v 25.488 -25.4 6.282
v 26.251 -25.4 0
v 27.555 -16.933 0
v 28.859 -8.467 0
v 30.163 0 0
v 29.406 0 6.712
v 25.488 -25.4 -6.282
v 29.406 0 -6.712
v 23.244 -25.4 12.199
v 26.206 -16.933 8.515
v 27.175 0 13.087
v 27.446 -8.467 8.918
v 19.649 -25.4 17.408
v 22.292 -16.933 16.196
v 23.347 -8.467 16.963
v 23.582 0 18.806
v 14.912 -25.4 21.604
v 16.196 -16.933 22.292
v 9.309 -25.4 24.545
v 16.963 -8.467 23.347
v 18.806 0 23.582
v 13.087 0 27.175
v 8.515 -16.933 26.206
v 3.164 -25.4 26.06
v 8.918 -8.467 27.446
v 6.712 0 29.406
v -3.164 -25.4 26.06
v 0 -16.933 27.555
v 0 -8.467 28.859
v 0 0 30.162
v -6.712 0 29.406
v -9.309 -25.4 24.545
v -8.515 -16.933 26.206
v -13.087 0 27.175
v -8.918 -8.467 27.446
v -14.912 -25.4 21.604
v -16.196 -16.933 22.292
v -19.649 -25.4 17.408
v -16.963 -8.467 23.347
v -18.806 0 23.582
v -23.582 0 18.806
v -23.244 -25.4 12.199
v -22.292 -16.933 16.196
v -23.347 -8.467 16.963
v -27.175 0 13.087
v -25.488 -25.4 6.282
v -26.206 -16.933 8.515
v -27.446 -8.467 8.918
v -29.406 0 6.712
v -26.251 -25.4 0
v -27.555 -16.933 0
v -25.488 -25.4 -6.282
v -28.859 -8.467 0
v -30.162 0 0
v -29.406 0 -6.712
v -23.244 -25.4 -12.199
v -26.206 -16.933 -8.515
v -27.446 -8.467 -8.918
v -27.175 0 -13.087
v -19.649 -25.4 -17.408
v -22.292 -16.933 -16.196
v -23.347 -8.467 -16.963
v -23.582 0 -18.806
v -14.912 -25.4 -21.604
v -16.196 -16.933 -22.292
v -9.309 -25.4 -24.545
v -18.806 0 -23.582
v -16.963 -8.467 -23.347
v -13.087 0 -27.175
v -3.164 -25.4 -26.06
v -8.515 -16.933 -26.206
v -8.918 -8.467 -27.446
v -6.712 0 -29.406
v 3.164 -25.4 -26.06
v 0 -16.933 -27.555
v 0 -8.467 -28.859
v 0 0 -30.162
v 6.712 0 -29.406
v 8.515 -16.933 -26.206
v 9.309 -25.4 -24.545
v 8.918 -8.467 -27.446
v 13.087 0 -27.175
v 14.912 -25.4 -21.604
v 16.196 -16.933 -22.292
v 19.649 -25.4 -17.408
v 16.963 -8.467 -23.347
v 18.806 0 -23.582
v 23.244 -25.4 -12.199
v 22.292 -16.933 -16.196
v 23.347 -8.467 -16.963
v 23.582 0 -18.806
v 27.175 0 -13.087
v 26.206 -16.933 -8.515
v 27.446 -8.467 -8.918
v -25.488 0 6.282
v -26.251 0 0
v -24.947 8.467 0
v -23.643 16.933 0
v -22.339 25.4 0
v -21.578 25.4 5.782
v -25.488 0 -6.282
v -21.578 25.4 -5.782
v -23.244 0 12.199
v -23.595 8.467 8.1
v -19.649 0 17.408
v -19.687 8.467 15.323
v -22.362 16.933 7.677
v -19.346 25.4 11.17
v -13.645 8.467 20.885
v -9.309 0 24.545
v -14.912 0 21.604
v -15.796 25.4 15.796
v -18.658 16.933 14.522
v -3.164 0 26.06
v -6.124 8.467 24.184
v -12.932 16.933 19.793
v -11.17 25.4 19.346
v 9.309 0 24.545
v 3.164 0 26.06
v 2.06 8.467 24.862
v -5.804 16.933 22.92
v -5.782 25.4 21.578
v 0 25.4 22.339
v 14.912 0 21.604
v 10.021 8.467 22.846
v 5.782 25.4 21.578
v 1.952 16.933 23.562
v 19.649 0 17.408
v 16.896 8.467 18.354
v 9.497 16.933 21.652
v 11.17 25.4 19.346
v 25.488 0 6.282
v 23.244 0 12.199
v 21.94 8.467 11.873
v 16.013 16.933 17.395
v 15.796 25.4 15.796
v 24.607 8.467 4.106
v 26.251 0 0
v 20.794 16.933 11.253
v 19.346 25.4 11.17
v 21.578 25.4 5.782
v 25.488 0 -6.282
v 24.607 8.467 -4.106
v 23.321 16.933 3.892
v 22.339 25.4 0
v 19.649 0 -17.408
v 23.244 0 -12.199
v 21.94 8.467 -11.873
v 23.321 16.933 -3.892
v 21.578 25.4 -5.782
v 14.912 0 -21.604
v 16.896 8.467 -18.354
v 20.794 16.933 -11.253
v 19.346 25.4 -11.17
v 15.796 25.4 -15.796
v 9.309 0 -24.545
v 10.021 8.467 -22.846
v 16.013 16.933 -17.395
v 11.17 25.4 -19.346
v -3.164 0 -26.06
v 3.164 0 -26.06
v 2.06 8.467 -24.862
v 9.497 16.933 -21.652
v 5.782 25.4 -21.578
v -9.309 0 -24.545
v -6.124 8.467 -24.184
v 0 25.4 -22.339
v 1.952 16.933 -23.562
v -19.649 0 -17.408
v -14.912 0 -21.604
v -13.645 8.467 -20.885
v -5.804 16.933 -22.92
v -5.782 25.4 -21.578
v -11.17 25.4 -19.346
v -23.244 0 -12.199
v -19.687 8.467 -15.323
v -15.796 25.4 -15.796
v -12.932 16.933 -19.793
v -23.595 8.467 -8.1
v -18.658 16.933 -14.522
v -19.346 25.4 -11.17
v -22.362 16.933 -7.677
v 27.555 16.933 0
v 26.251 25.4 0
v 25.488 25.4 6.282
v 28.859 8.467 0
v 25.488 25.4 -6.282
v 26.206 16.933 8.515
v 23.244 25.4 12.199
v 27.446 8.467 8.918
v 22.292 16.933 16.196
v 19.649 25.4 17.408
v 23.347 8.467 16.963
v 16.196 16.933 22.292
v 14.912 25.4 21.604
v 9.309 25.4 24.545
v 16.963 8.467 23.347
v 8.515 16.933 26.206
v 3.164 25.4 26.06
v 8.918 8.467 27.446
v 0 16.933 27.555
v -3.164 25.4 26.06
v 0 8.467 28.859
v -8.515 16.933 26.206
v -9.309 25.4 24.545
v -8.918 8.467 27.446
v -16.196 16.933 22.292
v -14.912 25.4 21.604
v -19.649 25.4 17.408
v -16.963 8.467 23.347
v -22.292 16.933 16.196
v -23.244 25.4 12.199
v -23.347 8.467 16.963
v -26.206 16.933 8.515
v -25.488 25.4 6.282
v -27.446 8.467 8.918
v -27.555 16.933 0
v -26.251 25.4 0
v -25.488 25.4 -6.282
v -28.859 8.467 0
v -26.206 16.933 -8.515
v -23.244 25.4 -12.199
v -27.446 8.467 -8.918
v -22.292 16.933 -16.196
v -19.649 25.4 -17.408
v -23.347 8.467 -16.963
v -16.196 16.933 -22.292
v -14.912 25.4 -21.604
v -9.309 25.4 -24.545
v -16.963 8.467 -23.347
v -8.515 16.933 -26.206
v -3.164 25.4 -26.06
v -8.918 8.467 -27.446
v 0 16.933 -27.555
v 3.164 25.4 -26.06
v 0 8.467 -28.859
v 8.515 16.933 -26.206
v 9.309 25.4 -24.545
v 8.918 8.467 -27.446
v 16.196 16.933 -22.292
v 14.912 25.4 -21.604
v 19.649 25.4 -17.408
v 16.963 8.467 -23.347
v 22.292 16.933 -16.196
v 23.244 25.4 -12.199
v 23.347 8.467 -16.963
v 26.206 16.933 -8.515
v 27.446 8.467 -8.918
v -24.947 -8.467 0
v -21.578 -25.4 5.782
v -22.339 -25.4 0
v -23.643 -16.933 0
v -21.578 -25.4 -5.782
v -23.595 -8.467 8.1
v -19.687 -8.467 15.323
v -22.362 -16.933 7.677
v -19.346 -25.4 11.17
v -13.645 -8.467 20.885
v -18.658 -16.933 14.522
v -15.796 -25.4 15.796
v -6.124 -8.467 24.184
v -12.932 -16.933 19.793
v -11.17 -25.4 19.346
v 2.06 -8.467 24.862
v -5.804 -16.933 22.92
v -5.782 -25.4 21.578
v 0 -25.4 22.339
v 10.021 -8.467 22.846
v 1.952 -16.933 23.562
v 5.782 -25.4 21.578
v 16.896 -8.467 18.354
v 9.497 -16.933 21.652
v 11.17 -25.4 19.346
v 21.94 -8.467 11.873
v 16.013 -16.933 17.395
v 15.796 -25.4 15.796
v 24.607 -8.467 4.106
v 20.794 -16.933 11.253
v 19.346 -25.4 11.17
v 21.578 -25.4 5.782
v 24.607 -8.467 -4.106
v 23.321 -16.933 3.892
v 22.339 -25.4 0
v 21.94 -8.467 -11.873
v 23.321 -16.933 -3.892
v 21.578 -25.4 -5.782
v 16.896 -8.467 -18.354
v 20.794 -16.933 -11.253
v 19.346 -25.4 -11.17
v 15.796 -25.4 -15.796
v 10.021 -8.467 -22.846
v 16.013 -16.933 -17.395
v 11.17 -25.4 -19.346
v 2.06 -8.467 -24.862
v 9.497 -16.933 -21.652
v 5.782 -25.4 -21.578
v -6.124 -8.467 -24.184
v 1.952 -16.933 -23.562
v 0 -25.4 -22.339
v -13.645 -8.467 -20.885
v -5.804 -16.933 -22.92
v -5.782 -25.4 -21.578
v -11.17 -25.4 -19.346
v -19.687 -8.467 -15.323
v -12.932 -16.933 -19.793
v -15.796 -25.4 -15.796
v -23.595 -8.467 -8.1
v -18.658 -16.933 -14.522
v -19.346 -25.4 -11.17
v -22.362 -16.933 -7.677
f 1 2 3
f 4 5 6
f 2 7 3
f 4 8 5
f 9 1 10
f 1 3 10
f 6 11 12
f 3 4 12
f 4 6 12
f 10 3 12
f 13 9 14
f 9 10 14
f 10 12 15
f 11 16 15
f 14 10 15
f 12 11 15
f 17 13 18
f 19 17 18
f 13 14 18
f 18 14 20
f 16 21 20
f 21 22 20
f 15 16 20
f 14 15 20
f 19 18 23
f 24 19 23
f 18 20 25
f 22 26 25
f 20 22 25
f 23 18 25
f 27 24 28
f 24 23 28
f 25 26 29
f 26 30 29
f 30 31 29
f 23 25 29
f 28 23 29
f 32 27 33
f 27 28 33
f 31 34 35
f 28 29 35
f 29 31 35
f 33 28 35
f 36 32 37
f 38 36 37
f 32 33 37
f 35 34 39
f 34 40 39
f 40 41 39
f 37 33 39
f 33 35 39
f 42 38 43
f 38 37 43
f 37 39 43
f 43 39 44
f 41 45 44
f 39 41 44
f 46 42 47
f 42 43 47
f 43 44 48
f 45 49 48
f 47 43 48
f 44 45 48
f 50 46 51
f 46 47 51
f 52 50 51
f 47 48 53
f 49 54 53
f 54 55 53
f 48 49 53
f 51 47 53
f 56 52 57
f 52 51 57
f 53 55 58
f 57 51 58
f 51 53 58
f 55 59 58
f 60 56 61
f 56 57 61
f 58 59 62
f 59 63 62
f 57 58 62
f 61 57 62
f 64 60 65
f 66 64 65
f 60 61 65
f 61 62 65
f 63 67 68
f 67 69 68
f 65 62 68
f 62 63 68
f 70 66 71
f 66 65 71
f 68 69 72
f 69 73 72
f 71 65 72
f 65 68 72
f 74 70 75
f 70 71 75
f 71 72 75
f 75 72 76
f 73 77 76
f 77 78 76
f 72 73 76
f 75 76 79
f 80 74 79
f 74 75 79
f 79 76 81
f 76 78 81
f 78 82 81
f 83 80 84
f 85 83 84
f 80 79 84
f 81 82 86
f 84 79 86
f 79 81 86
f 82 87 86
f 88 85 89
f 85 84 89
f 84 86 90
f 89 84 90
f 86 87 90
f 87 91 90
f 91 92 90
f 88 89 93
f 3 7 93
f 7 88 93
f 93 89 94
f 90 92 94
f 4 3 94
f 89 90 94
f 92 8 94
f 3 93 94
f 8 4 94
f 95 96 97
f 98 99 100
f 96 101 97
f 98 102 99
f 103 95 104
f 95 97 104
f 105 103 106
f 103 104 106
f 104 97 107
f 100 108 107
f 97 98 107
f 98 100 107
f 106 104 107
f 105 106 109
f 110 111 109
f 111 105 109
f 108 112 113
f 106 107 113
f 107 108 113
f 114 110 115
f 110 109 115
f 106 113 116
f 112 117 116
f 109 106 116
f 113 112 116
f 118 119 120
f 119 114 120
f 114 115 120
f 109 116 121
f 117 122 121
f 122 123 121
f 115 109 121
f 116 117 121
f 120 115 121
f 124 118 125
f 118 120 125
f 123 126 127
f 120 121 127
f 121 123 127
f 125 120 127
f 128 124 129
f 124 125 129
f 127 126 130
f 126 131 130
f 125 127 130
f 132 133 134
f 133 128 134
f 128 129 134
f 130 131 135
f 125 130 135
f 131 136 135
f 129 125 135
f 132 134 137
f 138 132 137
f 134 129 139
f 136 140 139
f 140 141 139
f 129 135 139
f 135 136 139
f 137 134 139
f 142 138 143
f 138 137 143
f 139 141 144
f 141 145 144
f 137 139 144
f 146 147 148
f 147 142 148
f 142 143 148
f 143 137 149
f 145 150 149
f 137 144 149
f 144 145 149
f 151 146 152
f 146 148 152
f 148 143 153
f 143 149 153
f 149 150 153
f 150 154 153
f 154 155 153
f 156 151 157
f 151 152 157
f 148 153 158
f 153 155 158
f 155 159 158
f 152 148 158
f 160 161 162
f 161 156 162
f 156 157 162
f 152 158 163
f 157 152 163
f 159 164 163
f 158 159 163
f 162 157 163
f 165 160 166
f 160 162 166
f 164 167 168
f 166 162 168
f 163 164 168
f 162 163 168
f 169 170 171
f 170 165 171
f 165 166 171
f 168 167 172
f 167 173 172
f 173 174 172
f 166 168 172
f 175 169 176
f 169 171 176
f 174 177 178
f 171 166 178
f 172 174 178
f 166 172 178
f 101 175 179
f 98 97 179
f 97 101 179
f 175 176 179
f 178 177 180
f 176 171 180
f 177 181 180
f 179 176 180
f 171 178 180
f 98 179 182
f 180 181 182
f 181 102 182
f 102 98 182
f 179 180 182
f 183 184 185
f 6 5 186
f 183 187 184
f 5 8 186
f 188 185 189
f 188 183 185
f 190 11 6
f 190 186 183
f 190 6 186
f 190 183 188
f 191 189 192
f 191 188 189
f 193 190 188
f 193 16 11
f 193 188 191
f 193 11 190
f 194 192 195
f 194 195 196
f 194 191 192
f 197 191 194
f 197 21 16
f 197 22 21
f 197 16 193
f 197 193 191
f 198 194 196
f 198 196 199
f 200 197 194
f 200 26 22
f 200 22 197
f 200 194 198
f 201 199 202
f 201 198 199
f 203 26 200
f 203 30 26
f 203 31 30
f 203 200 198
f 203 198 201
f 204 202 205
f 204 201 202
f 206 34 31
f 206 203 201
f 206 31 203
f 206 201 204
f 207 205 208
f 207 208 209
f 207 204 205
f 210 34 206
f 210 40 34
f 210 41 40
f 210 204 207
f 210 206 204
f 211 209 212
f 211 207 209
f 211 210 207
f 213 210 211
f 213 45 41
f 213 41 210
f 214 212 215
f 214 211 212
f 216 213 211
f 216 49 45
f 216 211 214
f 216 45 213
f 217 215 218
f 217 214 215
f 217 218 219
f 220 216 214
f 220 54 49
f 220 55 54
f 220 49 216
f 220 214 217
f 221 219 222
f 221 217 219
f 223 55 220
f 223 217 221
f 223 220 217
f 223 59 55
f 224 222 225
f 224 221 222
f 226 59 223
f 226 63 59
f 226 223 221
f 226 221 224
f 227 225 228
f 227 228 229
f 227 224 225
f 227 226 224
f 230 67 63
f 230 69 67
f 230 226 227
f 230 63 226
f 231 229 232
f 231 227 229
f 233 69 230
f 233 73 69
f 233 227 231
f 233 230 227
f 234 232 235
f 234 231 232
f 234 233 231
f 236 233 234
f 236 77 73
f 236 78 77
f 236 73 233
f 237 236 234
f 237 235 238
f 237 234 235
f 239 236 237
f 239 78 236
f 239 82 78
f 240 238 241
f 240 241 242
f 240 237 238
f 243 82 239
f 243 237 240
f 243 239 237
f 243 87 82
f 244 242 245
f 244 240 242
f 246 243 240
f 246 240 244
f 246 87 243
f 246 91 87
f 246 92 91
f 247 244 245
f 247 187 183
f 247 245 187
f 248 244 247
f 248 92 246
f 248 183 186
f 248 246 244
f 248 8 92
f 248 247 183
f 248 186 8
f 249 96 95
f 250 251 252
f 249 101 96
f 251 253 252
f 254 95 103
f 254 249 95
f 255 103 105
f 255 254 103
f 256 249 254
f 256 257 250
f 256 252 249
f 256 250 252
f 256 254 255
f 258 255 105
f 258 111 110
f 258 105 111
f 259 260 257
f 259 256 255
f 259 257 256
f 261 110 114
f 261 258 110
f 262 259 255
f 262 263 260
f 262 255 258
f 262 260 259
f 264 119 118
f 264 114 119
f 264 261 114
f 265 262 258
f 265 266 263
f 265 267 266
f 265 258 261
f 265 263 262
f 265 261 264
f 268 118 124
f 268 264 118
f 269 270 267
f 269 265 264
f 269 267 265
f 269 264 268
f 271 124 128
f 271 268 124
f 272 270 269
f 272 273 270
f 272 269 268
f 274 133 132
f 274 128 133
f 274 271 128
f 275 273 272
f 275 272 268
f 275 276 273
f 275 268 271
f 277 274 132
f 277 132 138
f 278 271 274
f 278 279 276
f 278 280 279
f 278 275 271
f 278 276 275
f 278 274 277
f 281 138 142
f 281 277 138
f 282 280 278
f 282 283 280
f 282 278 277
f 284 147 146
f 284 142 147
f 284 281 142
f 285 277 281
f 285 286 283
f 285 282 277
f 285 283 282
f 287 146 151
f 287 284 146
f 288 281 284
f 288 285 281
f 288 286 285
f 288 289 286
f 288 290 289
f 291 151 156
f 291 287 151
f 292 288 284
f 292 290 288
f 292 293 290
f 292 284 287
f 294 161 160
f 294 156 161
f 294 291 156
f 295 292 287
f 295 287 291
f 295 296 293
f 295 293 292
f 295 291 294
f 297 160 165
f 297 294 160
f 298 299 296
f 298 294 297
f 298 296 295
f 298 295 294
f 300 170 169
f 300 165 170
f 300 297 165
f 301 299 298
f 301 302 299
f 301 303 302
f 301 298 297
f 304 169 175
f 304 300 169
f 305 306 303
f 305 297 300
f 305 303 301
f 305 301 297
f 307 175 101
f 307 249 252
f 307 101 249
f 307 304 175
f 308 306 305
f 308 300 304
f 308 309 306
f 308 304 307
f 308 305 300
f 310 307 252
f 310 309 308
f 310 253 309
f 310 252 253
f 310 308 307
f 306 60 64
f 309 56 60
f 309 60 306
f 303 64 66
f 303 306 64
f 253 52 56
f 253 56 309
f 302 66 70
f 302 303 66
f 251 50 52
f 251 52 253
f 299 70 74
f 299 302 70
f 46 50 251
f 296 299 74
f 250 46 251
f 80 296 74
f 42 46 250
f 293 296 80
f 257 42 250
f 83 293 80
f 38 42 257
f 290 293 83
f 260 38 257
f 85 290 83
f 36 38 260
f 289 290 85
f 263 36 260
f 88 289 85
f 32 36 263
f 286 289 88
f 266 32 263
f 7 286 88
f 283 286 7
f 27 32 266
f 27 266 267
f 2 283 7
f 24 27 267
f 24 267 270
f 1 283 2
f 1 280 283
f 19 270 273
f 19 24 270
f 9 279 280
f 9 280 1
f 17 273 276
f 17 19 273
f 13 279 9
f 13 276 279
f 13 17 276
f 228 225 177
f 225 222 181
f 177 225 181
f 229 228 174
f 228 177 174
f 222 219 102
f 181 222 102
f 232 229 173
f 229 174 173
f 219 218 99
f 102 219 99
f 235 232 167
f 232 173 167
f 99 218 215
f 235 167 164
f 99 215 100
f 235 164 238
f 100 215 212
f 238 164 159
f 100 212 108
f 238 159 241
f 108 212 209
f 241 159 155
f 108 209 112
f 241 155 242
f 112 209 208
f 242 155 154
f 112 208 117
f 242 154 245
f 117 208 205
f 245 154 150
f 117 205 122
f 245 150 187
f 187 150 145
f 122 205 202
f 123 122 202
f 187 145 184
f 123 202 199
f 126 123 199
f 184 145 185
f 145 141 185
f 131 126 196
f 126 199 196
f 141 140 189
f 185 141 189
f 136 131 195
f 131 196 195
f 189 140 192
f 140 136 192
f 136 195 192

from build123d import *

# Parameters (mm, degrees)
F2_R = 26.2509
F0_R = 30.1625
F5_R = 26.2509
F4_R = 22.3393


with BuildPart() as f3:
    # F2 (on offset) → F3 section 0
    with BuildSketch(Plane.XZ.offset(25.4)):
        Circle(F2_R)
    # F0 (on Front) → F3 section 1
    with BuildSketch(Plane.XZ):
        Circle(F0_R)
    loft()

    # F5 (on face) → F6 section 0
    with BuildSketch(Plane(origin=(0, 0, 0), x_dir=(-1, 0, 0), z_dir=(0, 1, 0))):
        Circle(F5_R)
    # F4 (on face) → F6 section 1
    with BuildSketch(Plane.XZ.offset(25.4)):
        Circle(F4_R)
    loft(mode=Mode.SUBTRACT)

    # F7: F3 across face


with BuildPart() as f3_1:
    add(f3.part)
    add(f3.part.mirror(Plane(origin=(0, 0, 0), x_dir=(-1, 0, 0), z_dir=(0, 1, 0))))


solid = f3_1.part
